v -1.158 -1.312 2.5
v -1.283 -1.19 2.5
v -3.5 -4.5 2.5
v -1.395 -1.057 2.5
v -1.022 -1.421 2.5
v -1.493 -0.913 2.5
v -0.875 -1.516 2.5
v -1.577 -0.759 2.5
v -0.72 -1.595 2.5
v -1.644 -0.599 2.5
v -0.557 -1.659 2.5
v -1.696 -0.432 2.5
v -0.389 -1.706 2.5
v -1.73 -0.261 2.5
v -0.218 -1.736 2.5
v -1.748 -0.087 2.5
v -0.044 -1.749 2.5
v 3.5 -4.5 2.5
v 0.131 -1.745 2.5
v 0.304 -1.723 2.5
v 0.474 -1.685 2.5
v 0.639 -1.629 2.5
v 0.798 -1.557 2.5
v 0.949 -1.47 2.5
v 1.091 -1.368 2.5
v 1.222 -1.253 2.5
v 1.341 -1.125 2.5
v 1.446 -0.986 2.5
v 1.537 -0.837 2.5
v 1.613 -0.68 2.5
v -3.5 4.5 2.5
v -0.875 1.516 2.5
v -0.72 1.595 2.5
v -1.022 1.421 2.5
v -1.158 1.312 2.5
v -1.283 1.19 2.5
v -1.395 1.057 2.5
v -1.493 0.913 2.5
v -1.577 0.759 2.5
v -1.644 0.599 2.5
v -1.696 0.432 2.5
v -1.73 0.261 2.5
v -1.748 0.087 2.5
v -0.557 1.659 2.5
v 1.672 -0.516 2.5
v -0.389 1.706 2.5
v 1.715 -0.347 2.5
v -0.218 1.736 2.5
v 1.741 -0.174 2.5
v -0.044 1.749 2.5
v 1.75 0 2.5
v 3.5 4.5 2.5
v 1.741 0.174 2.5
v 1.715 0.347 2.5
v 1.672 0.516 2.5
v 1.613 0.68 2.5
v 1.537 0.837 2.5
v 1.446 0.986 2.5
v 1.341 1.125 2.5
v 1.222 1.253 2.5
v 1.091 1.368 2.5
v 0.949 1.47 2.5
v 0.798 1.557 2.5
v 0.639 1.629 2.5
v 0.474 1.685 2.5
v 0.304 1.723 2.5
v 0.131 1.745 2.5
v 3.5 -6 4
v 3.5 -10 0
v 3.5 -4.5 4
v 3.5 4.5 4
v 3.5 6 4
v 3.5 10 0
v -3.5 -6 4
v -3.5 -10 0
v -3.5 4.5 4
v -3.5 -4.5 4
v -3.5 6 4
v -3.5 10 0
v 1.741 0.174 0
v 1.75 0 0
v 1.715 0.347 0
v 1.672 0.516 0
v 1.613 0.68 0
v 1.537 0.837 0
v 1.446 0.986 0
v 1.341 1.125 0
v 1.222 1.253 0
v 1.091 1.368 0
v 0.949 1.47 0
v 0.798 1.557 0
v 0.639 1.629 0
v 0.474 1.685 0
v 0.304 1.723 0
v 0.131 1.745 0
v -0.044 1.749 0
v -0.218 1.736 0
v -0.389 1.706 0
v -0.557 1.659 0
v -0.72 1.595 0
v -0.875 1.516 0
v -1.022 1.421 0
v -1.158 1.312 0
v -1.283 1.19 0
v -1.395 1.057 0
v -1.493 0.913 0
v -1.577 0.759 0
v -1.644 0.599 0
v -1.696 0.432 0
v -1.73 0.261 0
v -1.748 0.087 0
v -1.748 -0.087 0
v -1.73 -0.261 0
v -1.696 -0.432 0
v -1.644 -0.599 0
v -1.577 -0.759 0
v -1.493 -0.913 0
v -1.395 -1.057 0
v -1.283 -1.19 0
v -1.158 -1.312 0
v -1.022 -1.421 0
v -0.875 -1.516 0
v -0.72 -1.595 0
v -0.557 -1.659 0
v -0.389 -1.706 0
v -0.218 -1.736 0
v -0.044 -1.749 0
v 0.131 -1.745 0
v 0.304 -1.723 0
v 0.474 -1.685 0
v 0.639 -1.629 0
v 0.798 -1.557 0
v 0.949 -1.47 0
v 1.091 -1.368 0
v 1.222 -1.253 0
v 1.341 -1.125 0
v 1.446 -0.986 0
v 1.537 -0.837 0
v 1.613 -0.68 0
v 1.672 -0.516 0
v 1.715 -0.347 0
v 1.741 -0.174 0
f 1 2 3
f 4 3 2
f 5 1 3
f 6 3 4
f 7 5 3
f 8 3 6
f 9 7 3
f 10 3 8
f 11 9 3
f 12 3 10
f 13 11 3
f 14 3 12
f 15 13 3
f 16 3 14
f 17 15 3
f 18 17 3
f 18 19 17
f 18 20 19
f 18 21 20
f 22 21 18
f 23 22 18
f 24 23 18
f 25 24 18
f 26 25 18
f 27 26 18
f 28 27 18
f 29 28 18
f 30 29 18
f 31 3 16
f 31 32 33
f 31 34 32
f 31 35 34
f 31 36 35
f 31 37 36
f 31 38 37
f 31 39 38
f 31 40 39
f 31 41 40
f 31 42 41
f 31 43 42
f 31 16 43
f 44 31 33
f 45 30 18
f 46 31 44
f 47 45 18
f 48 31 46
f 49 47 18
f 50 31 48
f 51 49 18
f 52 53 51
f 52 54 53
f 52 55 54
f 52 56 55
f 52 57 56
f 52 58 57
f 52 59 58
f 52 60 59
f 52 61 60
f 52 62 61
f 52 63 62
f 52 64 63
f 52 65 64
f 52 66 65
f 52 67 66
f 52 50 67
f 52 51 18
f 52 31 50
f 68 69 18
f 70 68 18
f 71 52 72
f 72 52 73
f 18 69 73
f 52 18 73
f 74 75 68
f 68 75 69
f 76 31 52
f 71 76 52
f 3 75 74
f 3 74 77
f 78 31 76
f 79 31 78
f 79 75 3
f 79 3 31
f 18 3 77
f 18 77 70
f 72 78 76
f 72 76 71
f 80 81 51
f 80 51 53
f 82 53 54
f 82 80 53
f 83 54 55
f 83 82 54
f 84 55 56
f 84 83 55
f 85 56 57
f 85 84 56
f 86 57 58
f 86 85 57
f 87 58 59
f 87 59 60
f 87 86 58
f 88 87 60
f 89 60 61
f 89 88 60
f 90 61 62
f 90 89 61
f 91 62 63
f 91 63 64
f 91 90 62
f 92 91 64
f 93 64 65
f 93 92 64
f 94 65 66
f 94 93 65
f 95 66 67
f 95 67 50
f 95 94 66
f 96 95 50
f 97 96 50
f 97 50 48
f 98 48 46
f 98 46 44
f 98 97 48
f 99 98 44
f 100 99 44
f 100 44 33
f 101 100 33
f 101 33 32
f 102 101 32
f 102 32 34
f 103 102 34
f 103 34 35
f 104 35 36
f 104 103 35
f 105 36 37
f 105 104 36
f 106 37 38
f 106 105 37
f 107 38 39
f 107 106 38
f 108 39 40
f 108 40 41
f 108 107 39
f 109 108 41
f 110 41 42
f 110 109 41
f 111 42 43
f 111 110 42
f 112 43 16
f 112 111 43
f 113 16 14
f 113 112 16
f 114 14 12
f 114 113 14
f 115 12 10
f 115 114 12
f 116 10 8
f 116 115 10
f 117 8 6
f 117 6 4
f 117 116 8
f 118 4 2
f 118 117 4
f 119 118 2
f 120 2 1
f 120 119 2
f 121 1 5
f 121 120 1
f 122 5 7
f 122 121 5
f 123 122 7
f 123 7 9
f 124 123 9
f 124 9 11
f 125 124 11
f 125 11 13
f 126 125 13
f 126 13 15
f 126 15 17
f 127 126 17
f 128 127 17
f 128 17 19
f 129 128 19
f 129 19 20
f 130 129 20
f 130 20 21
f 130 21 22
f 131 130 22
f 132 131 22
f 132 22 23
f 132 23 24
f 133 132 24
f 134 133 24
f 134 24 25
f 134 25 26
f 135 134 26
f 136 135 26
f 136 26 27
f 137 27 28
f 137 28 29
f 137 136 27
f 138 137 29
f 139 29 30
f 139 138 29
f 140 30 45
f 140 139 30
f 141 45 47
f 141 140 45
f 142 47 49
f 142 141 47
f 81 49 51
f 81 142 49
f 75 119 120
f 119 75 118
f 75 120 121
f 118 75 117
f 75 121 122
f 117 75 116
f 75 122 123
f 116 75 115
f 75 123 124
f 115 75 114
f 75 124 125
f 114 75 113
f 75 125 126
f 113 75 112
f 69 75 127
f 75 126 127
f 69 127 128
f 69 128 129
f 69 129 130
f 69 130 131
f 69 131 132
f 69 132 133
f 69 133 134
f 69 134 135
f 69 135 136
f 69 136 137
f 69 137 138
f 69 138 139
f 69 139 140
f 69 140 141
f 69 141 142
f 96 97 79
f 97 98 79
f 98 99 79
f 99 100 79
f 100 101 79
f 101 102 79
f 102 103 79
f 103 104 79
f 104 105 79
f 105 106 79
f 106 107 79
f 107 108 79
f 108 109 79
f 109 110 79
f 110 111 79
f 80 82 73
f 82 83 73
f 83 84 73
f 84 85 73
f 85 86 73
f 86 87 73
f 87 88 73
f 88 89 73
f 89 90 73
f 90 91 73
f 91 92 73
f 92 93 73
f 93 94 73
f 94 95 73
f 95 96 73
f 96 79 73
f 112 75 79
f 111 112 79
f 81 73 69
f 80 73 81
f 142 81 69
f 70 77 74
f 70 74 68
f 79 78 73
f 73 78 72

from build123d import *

# Parameters (mm, degrees)
F0_W     = 7
F0_H     = 20
F0_R     = 1.75
F1_DEPTH = 2.5
F2_W     = 7
F2_H     = 5.5
F3_DEPTH = 1.5
F4_SIZE  = 3.99999


# Not quite as in the source:
# - a fillet or chamfer is up to 0.001 mm smaller than in the source, because OpenCascade refuses the exact size


with BuildPart() as f1:
    # F0 (on Top) → F1 (new body)
    with BuildSketch(Plane.XY):
        Rectangle(F0_W, F0_H)
        Circle(F0_R, mode=Mode.SUBTRACT)
    extrude(amount=F1_DEPTH)

    # F2 (on face) → F3 (join)
    with BuildSketch(Plane.XY.offset(2.5)):
        with Locations((0, 7.25)):
            Rectangle(F2_W, F2_H)
        with Locations((0, -7.25)):
            Rectangle(F2_W, F2_H)
    extrude(amount=F3_DEPTH)

    # F4 (size 4 in the source; OpenCascade refuses exactly that, so slightly less here)
    f4_edges = [f1.edges().sort_by_distance(p)[0] for p in [
        (0, 10, 4),
        (0, -10, 4),
    ]]
    chamfer(f4_edges, length=F4_SIZE)


solid = f1.part
